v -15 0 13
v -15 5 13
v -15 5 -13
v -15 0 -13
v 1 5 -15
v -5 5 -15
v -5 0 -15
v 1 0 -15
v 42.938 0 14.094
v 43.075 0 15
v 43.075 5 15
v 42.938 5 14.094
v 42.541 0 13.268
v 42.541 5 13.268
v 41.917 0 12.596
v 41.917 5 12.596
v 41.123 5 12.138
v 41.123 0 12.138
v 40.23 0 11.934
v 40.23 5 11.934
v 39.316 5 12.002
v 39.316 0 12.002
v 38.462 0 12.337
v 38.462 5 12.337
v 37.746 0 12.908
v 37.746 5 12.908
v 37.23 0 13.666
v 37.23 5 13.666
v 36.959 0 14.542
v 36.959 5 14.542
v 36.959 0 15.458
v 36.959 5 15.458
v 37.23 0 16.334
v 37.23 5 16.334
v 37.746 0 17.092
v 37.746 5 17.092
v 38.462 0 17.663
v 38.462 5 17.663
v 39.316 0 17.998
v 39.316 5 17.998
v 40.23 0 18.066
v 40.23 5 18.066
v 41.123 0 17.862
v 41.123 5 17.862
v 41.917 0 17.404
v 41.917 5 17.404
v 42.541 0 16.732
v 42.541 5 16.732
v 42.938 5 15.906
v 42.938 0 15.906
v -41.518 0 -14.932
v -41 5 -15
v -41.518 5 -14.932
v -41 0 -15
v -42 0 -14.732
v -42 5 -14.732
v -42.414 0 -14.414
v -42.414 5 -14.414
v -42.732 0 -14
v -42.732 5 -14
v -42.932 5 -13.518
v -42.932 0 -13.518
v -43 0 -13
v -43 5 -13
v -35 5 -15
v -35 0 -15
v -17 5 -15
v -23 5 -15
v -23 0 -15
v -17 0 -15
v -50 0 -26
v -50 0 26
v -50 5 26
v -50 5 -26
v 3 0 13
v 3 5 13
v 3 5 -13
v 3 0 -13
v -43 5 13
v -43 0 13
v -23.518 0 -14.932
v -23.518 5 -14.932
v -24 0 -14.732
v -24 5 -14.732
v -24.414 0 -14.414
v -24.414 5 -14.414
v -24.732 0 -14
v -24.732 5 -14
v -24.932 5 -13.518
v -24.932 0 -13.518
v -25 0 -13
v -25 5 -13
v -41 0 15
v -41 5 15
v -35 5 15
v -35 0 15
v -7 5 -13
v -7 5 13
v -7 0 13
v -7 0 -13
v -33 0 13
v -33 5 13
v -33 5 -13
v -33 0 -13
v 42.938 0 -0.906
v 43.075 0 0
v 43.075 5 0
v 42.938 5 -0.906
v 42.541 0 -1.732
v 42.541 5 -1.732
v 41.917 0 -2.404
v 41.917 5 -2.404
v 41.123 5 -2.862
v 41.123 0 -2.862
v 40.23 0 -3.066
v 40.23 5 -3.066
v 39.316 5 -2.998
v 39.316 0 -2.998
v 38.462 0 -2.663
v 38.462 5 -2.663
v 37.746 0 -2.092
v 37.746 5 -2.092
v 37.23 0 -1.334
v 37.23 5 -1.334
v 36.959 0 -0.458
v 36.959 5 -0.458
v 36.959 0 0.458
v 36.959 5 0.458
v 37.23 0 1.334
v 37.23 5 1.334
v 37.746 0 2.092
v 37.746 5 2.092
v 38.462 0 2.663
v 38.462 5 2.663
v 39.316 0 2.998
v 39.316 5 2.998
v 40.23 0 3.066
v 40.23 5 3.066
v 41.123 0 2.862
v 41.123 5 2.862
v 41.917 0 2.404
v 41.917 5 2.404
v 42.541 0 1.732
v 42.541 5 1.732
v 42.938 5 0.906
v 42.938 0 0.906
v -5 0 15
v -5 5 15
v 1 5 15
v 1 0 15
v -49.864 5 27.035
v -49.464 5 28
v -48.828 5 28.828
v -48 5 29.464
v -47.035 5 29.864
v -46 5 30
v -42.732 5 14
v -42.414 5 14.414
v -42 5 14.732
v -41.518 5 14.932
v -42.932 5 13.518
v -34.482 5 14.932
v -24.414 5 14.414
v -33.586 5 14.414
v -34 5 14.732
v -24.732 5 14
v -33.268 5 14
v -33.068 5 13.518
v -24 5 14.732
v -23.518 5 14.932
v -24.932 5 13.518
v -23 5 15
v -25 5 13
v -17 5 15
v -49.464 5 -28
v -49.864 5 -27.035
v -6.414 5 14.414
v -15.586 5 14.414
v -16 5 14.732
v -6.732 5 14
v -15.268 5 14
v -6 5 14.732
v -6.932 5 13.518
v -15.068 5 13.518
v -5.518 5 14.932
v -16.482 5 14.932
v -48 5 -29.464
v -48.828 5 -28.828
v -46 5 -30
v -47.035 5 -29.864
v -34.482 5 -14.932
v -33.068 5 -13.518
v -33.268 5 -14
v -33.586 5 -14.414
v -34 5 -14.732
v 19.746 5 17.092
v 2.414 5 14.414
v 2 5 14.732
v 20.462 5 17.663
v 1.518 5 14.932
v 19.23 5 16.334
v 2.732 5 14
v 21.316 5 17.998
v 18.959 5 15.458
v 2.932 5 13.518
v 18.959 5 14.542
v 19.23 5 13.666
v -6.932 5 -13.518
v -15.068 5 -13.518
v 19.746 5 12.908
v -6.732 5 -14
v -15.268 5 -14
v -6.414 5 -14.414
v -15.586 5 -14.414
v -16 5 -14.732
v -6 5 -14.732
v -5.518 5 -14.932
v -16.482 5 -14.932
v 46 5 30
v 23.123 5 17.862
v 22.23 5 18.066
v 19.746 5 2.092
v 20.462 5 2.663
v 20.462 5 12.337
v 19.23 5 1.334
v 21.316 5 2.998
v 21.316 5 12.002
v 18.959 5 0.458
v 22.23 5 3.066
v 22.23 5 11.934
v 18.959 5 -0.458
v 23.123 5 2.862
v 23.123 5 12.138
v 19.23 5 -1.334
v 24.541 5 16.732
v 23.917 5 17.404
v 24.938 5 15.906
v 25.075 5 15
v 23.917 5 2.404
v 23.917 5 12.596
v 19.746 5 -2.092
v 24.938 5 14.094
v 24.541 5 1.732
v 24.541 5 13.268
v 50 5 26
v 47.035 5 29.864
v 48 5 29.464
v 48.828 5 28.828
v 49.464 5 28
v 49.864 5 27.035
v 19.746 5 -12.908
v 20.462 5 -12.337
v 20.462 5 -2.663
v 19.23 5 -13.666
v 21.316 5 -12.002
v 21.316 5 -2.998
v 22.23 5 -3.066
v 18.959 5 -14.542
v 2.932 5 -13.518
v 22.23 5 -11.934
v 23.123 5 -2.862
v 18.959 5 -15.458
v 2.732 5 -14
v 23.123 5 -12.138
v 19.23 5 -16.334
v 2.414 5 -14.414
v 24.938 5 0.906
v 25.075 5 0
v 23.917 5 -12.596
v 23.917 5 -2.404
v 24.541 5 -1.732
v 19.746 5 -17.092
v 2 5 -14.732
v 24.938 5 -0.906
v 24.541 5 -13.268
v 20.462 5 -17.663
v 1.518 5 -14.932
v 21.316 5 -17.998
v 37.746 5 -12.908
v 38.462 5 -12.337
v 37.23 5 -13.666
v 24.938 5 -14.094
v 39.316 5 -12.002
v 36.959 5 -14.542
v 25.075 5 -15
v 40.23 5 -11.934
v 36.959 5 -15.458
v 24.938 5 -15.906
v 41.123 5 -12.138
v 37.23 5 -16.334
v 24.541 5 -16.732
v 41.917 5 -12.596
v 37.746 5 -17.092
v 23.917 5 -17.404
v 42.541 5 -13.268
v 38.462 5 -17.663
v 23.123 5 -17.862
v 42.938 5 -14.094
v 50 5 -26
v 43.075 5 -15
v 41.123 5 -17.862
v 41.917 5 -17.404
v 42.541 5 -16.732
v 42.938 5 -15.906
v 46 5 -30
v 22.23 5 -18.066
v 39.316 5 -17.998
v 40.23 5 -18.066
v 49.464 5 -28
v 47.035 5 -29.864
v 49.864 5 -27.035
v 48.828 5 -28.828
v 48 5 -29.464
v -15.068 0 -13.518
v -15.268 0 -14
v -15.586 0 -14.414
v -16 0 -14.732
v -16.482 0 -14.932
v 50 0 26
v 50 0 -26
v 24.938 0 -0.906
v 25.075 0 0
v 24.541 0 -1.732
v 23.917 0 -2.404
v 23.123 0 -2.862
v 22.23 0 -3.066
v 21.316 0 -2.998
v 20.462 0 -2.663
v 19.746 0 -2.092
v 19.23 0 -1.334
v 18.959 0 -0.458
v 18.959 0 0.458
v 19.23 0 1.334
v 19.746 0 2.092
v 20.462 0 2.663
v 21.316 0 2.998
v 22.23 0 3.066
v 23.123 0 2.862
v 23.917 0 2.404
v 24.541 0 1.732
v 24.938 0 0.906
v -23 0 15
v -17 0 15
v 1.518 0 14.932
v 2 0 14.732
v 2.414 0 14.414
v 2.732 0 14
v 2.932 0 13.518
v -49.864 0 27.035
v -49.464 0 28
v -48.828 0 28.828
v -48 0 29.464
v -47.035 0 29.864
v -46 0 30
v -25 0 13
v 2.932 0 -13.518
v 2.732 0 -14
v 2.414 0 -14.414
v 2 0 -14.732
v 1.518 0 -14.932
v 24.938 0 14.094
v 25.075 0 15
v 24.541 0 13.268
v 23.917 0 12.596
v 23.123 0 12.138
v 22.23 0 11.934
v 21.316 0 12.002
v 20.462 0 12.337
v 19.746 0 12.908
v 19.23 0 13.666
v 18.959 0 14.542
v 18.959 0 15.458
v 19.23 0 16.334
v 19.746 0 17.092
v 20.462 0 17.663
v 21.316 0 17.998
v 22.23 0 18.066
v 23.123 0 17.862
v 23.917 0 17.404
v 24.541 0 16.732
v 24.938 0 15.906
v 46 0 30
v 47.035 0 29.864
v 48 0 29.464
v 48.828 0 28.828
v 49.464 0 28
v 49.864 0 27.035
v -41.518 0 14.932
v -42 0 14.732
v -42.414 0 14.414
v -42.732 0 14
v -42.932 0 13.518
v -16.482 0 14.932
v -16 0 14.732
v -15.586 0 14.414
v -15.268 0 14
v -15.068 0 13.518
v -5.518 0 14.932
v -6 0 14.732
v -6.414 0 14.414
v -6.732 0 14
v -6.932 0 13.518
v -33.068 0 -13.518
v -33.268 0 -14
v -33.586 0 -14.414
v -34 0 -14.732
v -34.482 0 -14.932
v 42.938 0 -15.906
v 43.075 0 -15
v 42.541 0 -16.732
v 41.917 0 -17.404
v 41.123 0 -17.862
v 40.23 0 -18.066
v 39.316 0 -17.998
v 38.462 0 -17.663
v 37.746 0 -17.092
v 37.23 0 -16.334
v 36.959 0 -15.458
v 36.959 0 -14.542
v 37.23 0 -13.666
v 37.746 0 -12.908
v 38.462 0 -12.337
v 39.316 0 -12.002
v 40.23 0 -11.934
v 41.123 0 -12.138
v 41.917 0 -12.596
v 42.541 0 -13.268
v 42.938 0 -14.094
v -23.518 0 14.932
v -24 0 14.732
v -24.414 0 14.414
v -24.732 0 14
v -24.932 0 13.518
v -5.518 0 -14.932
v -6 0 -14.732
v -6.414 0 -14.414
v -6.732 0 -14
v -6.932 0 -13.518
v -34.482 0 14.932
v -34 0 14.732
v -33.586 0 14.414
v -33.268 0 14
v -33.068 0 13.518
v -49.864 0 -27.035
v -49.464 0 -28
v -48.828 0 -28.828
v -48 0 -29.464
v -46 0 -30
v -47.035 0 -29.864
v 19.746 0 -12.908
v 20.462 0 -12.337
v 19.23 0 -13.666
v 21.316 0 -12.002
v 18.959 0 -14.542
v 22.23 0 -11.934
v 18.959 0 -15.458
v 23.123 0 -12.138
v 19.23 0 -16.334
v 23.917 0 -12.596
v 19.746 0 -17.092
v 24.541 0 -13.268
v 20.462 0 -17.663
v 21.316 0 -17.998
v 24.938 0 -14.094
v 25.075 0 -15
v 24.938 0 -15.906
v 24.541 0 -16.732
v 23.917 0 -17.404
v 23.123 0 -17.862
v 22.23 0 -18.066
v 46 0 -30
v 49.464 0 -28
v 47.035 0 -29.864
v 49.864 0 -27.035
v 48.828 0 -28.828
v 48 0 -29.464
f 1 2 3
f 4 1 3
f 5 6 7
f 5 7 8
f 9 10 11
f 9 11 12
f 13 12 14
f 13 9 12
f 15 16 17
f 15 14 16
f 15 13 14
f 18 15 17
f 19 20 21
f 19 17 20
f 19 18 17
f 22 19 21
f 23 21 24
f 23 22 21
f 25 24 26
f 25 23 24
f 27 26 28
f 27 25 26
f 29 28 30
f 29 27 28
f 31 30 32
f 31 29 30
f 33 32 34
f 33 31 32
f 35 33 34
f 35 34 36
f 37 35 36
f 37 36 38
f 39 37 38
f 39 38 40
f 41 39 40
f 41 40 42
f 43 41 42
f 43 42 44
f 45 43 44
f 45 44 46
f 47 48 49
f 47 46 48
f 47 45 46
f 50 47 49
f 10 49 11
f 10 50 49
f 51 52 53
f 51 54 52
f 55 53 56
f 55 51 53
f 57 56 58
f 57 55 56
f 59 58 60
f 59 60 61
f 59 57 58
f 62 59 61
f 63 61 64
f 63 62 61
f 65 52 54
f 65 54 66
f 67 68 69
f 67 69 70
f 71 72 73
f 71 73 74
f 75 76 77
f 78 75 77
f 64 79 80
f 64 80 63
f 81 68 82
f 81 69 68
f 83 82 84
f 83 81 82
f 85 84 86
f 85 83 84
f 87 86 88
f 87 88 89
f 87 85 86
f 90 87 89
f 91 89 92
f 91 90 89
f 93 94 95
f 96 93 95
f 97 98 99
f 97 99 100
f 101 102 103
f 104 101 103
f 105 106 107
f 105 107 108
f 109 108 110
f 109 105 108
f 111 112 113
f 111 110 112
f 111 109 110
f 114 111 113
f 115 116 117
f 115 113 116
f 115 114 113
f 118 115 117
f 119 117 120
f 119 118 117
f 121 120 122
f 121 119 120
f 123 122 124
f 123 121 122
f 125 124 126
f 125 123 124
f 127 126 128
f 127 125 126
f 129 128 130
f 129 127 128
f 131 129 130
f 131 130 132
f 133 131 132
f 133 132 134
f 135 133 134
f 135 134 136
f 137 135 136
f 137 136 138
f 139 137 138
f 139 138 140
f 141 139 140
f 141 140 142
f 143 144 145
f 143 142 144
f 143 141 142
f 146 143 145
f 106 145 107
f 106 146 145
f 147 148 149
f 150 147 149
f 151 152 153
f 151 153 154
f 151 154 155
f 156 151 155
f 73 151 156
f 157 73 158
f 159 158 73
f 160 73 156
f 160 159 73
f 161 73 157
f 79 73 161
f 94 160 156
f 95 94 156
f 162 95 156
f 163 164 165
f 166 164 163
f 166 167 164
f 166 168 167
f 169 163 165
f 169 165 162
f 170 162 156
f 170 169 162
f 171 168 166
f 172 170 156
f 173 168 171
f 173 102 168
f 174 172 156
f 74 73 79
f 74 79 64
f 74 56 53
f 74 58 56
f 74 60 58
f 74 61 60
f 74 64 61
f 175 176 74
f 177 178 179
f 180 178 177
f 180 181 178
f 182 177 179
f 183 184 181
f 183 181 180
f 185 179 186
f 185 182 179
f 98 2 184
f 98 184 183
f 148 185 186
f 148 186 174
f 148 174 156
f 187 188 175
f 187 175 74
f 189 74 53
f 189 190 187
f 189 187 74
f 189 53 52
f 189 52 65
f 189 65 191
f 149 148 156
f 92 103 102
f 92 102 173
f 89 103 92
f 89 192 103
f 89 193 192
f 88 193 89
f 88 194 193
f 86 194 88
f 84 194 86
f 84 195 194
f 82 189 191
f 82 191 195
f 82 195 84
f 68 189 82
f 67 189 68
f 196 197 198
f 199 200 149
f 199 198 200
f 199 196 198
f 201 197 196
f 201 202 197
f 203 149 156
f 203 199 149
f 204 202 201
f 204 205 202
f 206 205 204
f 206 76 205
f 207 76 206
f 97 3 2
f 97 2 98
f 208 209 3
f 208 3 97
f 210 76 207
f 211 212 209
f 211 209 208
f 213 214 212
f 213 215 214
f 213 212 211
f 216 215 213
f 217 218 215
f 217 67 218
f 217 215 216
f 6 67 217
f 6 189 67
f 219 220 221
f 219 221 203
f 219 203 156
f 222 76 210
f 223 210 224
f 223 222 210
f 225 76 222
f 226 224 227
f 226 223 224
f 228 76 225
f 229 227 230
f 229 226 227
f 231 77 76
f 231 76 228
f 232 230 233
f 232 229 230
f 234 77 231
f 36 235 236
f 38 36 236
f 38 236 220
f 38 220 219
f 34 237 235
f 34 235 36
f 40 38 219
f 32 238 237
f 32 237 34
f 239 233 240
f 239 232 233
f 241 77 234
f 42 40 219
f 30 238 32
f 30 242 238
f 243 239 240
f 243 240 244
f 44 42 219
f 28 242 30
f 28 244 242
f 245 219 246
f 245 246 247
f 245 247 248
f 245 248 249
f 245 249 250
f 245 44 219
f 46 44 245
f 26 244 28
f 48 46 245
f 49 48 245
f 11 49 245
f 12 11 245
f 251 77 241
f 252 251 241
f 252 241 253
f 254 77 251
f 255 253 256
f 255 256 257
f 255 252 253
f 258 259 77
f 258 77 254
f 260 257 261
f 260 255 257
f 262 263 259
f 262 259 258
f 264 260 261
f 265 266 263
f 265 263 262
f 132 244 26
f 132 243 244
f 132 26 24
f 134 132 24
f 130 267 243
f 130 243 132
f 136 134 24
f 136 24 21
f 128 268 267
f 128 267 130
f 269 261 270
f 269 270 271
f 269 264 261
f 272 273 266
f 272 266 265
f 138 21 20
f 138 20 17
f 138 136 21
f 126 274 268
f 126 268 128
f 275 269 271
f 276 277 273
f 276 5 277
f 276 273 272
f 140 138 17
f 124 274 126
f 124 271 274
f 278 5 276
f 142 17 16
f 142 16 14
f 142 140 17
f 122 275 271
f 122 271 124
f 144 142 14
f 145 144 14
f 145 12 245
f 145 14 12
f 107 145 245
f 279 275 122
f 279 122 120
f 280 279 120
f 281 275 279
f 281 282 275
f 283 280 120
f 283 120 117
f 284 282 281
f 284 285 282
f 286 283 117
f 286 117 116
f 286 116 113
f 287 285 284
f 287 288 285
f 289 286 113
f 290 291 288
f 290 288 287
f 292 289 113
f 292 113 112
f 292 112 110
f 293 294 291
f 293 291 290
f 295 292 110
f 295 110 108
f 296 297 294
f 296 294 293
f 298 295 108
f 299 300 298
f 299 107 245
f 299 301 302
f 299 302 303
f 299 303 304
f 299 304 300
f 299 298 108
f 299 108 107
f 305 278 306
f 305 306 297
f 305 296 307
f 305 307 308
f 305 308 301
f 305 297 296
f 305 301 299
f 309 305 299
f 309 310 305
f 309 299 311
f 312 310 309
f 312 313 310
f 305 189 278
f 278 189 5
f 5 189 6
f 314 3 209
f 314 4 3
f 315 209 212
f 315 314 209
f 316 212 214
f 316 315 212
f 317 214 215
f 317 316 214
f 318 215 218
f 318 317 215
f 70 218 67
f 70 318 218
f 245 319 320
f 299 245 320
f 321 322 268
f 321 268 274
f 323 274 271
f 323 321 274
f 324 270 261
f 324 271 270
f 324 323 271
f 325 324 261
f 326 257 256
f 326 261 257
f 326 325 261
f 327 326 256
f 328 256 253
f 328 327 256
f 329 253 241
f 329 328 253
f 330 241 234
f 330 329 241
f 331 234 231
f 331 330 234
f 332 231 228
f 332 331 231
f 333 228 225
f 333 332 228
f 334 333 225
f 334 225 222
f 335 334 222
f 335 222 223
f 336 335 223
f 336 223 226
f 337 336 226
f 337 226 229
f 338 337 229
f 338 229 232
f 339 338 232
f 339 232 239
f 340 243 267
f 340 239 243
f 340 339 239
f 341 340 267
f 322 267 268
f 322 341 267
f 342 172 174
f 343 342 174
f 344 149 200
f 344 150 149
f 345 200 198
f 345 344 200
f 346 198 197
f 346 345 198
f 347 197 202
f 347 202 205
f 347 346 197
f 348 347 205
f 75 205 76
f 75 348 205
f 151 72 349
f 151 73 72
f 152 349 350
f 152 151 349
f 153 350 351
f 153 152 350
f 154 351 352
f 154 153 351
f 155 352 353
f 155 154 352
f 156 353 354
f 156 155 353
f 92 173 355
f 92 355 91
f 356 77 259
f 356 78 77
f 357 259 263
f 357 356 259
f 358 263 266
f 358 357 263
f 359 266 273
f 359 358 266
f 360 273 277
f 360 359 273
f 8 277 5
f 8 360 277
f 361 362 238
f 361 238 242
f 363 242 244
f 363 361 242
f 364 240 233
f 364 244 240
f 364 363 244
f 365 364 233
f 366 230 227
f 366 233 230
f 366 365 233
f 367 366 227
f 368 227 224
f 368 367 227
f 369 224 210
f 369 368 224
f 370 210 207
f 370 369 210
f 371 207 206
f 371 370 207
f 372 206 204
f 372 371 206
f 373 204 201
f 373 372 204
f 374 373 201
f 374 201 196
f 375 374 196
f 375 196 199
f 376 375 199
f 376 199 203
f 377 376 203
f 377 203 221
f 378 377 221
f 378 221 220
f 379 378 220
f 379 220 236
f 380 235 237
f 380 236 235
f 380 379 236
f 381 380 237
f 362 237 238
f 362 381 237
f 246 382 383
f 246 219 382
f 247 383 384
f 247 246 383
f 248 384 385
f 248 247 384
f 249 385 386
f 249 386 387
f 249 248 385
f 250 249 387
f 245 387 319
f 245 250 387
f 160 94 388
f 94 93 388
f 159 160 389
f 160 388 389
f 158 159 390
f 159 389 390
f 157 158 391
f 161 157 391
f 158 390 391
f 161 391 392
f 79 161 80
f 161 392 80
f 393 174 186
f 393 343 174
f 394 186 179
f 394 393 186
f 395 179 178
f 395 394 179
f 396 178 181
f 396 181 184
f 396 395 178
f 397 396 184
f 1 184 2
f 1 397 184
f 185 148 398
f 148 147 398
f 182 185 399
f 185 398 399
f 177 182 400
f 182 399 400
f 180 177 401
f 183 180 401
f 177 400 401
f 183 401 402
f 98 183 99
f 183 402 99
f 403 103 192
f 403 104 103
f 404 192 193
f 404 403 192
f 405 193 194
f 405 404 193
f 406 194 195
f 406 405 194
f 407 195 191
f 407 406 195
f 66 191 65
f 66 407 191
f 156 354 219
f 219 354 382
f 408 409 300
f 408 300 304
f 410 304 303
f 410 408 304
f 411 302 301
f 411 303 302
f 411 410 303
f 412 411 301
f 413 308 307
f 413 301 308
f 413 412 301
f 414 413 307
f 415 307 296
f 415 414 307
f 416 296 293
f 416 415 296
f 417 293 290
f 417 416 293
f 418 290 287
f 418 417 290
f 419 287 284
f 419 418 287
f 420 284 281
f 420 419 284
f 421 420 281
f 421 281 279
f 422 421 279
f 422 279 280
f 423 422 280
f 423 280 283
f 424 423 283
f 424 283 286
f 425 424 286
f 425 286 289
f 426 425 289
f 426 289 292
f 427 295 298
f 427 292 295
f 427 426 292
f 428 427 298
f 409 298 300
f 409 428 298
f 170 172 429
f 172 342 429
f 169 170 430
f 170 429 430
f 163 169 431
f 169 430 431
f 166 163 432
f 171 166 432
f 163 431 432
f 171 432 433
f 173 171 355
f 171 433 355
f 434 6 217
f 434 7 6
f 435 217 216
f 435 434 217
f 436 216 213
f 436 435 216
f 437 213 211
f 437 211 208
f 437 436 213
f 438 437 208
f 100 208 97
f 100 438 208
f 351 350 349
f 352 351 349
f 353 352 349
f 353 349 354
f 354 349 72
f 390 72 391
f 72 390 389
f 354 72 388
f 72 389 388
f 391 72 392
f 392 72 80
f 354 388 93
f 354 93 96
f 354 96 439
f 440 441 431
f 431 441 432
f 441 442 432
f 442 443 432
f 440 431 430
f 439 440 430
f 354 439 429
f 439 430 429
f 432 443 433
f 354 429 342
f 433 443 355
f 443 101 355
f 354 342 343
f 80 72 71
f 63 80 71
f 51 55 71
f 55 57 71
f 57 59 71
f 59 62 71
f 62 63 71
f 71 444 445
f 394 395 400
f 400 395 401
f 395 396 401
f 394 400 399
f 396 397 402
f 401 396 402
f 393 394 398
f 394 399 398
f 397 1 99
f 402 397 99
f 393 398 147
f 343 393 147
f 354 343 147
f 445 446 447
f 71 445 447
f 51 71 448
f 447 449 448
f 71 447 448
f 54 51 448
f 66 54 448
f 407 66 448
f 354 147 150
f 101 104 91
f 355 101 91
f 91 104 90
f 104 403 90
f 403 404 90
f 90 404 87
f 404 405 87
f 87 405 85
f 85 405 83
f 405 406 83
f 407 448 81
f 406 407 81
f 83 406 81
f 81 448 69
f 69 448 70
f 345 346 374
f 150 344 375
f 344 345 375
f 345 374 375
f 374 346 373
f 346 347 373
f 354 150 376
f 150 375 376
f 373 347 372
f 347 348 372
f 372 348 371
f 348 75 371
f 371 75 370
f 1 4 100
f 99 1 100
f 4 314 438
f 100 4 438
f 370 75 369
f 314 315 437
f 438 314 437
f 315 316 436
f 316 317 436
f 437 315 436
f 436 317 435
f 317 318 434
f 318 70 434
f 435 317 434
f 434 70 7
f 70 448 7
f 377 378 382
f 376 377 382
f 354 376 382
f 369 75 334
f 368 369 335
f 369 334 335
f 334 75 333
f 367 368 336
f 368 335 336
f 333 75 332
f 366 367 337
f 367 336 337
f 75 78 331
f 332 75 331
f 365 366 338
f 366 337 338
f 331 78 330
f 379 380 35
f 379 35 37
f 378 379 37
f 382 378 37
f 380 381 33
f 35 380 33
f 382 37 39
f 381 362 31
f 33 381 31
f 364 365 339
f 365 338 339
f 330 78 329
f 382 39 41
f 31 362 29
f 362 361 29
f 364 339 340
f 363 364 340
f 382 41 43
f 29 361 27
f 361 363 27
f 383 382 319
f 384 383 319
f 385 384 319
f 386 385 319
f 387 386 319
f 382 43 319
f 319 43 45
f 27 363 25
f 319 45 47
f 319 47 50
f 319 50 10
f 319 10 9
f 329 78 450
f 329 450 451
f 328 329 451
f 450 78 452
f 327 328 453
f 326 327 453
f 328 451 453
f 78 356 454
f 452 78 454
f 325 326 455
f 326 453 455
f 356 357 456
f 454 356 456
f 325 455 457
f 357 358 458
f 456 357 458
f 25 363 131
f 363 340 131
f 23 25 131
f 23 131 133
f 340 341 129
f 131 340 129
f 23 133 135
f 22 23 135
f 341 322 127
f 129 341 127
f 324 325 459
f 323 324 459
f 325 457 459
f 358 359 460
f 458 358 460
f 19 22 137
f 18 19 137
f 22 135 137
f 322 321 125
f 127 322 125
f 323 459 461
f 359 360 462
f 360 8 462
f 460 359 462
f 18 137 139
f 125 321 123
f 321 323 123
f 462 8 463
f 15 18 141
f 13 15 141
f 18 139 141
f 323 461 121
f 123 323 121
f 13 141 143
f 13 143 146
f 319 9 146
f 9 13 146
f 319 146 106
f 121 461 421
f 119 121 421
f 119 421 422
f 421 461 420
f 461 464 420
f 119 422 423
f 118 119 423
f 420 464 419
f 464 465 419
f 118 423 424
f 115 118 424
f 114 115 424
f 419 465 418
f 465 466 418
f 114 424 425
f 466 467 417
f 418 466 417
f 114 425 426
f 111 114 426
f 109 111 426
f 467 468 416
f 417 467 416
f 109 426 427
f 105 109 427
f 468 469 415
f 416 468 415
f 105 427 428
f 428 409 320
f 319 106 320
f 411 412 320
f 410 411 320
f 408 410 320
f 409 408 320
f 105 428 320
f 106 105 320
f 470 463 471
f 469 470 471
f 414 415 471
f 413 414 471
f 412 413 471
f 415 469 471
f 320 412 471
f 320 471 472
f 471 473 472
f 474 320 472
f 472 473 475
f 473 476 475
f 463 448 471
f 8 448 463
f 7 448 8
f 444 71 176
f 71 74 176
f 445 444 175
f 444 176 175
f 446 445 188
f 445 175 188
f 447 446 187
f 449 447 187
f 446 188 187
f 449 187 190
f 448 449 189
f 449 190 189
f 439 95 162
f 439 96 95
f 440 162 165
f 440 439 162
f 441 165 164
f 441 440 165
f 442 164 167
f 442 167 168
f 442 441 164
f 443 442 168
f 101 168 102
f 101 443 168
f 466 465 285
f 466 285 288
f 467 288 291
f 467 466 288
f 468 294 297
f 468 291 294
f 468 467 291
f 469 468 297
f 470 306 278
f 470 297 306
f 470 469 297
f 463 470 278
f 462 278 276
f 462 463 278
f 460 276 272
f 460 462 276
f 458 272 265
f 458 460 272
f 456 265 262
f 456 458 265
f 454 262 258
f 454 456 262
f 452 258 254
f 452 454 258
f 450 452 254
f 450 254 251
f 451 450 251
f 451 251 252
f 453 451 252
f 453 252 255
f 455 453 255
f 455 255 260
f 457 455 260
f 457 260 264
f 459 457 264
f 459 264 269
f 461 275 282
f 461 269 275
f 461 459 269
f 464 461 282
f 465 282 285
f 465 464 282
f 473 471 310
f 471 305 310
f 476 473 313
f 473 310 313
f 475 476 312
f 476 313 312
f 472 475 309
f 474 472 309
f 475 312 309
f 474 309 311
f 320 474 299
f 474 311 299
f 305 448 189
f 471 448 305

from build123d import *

# Parameters (mm, degrees)
SKETCH1_W              = 100
SKETCH1_H              = 60
BOSS_EXTRUDE1_DEPTH    = 5
CUT_EXTRUDE1_START     = -6
SKETCH2_R              = 3.075
CUT_EXTRUDE1_DEPTH     = 7
SKETCH3_W              = 10
SKETCH3_H              = 30
CUT_EXTRUDE2_DEPTH     = 6
FILLET2_R              = 2
LPATTERN1_COUNT        = 3
LPATTERN1_PITCH        = 18
FILLET2_OF_LPATTERN1_R = 2
LPATTERN2_COUNT        = 2
LPATTERN2_PITCH        = 18
FILLET1_R              = 4


with BuildPart() as part:
    # Sketch1 → Boss-Extrude1 (new body)
    with BuildSketch(Plane(origin=(0, 0, 0), x_dir=(1, 0, 0), z_dir=(0, 1, 0))):
        Rectangle(SKETCH1_W, SKETCH1_H)
    extrude(amount=BOSS_EXTRUDE1_DEPTH)

    # Sketch2 → Cut-Extrude1 (cut)
    with BuildSketch(Plane(origin=(0, 5, 0), x_dir=(1, 0, 0), z_dir=(0, 1, 0)).offset(CUT_EXTRUDE1_START)):
        with Locations((40, 15)):
            Circle(SKETCH2_R)
        with Locations((40, -15)):
            Circle(SKETCH2_R)
        with Locations((40, 0)):
            Circle(SKETCH2_R)
    cut_extrude1 = extrude(amount=CUT_EXTRUDE1_DEPTH, mode=Mode.SUBTRACT)

    # Sketch3 → Cut-Extrude2 (cut, through all)
    with BuildSketch(Plane(origin=(0, 5, 0), x_dir=(1, 0, 0), z_dir=(0, 1, 0))):
        with Locations((-38, 0)):
            Rectangle(SKETCH3_W, SKETCH3_H)
    cut_extrude2 = extrude(amount=-CUT_EXTRUDE2_DEPTH, mode=Mode.SUBTRACT)

    # Fillet2
    fillet2_edges = [part.edges().sort_by_distance(p)[0] for p in [
        (-33, 2.5, -15),
        (-33, 2.5, 15),
        (-43, 2.5, 15),
        (-43, 2.5, -15),
    ]]
    fillet(fillet2_edges, radius=FILLET2_R)

    # LPattern1: Cut-Extrude2 ×3
    with Locations(*[(i * LPATTERN1_PITCH, 0, 0) for i in range(1, LPATTERN1_COUNT)]):
        add(cut_extrude2, mode=Mode.SUBTRACT)

    # Fillet2 of LPattern1
    fillet2_of_lpattern1_edges = [part.edges().sort_by_distance(p)[0] for p in [
        (-15, 2.5, -15),
        (-15, 2.5, 15),
        (-25, 2.5, 15),
        (-25, 2.5, -15),
        (3, 2.5, -15),
        (3, 2.5, 15),
        (-7, 2.5, 15),
        (-7, 2.5, -15),
    ]]
    fillet(fillet2_of_lpattern1_edges, radius=FILLET2_OF_LPATTERN1_R)

    # LPattern2: Cut-Extrude1 ×2
    with Locations(*[(-i * LPATTERN2_PITCH, 0, 0) for i in range(1, LPATTERN2_COUNT)]):
        add(cut_extrude1, mode=Mode.SUBTRACT)

    # Fillet1
    fillet1_edges = [part.edges().sort_by_distance(p)[0] for p in [
        (50, 2.5, 30),
        (-50, 2.5, 30),
        (-50, 2.5, -30),
        (50, 2.5, -30),
    ]]
    fillet(fillet1_edges, radius=FILLET1_R)


solid = part.part
